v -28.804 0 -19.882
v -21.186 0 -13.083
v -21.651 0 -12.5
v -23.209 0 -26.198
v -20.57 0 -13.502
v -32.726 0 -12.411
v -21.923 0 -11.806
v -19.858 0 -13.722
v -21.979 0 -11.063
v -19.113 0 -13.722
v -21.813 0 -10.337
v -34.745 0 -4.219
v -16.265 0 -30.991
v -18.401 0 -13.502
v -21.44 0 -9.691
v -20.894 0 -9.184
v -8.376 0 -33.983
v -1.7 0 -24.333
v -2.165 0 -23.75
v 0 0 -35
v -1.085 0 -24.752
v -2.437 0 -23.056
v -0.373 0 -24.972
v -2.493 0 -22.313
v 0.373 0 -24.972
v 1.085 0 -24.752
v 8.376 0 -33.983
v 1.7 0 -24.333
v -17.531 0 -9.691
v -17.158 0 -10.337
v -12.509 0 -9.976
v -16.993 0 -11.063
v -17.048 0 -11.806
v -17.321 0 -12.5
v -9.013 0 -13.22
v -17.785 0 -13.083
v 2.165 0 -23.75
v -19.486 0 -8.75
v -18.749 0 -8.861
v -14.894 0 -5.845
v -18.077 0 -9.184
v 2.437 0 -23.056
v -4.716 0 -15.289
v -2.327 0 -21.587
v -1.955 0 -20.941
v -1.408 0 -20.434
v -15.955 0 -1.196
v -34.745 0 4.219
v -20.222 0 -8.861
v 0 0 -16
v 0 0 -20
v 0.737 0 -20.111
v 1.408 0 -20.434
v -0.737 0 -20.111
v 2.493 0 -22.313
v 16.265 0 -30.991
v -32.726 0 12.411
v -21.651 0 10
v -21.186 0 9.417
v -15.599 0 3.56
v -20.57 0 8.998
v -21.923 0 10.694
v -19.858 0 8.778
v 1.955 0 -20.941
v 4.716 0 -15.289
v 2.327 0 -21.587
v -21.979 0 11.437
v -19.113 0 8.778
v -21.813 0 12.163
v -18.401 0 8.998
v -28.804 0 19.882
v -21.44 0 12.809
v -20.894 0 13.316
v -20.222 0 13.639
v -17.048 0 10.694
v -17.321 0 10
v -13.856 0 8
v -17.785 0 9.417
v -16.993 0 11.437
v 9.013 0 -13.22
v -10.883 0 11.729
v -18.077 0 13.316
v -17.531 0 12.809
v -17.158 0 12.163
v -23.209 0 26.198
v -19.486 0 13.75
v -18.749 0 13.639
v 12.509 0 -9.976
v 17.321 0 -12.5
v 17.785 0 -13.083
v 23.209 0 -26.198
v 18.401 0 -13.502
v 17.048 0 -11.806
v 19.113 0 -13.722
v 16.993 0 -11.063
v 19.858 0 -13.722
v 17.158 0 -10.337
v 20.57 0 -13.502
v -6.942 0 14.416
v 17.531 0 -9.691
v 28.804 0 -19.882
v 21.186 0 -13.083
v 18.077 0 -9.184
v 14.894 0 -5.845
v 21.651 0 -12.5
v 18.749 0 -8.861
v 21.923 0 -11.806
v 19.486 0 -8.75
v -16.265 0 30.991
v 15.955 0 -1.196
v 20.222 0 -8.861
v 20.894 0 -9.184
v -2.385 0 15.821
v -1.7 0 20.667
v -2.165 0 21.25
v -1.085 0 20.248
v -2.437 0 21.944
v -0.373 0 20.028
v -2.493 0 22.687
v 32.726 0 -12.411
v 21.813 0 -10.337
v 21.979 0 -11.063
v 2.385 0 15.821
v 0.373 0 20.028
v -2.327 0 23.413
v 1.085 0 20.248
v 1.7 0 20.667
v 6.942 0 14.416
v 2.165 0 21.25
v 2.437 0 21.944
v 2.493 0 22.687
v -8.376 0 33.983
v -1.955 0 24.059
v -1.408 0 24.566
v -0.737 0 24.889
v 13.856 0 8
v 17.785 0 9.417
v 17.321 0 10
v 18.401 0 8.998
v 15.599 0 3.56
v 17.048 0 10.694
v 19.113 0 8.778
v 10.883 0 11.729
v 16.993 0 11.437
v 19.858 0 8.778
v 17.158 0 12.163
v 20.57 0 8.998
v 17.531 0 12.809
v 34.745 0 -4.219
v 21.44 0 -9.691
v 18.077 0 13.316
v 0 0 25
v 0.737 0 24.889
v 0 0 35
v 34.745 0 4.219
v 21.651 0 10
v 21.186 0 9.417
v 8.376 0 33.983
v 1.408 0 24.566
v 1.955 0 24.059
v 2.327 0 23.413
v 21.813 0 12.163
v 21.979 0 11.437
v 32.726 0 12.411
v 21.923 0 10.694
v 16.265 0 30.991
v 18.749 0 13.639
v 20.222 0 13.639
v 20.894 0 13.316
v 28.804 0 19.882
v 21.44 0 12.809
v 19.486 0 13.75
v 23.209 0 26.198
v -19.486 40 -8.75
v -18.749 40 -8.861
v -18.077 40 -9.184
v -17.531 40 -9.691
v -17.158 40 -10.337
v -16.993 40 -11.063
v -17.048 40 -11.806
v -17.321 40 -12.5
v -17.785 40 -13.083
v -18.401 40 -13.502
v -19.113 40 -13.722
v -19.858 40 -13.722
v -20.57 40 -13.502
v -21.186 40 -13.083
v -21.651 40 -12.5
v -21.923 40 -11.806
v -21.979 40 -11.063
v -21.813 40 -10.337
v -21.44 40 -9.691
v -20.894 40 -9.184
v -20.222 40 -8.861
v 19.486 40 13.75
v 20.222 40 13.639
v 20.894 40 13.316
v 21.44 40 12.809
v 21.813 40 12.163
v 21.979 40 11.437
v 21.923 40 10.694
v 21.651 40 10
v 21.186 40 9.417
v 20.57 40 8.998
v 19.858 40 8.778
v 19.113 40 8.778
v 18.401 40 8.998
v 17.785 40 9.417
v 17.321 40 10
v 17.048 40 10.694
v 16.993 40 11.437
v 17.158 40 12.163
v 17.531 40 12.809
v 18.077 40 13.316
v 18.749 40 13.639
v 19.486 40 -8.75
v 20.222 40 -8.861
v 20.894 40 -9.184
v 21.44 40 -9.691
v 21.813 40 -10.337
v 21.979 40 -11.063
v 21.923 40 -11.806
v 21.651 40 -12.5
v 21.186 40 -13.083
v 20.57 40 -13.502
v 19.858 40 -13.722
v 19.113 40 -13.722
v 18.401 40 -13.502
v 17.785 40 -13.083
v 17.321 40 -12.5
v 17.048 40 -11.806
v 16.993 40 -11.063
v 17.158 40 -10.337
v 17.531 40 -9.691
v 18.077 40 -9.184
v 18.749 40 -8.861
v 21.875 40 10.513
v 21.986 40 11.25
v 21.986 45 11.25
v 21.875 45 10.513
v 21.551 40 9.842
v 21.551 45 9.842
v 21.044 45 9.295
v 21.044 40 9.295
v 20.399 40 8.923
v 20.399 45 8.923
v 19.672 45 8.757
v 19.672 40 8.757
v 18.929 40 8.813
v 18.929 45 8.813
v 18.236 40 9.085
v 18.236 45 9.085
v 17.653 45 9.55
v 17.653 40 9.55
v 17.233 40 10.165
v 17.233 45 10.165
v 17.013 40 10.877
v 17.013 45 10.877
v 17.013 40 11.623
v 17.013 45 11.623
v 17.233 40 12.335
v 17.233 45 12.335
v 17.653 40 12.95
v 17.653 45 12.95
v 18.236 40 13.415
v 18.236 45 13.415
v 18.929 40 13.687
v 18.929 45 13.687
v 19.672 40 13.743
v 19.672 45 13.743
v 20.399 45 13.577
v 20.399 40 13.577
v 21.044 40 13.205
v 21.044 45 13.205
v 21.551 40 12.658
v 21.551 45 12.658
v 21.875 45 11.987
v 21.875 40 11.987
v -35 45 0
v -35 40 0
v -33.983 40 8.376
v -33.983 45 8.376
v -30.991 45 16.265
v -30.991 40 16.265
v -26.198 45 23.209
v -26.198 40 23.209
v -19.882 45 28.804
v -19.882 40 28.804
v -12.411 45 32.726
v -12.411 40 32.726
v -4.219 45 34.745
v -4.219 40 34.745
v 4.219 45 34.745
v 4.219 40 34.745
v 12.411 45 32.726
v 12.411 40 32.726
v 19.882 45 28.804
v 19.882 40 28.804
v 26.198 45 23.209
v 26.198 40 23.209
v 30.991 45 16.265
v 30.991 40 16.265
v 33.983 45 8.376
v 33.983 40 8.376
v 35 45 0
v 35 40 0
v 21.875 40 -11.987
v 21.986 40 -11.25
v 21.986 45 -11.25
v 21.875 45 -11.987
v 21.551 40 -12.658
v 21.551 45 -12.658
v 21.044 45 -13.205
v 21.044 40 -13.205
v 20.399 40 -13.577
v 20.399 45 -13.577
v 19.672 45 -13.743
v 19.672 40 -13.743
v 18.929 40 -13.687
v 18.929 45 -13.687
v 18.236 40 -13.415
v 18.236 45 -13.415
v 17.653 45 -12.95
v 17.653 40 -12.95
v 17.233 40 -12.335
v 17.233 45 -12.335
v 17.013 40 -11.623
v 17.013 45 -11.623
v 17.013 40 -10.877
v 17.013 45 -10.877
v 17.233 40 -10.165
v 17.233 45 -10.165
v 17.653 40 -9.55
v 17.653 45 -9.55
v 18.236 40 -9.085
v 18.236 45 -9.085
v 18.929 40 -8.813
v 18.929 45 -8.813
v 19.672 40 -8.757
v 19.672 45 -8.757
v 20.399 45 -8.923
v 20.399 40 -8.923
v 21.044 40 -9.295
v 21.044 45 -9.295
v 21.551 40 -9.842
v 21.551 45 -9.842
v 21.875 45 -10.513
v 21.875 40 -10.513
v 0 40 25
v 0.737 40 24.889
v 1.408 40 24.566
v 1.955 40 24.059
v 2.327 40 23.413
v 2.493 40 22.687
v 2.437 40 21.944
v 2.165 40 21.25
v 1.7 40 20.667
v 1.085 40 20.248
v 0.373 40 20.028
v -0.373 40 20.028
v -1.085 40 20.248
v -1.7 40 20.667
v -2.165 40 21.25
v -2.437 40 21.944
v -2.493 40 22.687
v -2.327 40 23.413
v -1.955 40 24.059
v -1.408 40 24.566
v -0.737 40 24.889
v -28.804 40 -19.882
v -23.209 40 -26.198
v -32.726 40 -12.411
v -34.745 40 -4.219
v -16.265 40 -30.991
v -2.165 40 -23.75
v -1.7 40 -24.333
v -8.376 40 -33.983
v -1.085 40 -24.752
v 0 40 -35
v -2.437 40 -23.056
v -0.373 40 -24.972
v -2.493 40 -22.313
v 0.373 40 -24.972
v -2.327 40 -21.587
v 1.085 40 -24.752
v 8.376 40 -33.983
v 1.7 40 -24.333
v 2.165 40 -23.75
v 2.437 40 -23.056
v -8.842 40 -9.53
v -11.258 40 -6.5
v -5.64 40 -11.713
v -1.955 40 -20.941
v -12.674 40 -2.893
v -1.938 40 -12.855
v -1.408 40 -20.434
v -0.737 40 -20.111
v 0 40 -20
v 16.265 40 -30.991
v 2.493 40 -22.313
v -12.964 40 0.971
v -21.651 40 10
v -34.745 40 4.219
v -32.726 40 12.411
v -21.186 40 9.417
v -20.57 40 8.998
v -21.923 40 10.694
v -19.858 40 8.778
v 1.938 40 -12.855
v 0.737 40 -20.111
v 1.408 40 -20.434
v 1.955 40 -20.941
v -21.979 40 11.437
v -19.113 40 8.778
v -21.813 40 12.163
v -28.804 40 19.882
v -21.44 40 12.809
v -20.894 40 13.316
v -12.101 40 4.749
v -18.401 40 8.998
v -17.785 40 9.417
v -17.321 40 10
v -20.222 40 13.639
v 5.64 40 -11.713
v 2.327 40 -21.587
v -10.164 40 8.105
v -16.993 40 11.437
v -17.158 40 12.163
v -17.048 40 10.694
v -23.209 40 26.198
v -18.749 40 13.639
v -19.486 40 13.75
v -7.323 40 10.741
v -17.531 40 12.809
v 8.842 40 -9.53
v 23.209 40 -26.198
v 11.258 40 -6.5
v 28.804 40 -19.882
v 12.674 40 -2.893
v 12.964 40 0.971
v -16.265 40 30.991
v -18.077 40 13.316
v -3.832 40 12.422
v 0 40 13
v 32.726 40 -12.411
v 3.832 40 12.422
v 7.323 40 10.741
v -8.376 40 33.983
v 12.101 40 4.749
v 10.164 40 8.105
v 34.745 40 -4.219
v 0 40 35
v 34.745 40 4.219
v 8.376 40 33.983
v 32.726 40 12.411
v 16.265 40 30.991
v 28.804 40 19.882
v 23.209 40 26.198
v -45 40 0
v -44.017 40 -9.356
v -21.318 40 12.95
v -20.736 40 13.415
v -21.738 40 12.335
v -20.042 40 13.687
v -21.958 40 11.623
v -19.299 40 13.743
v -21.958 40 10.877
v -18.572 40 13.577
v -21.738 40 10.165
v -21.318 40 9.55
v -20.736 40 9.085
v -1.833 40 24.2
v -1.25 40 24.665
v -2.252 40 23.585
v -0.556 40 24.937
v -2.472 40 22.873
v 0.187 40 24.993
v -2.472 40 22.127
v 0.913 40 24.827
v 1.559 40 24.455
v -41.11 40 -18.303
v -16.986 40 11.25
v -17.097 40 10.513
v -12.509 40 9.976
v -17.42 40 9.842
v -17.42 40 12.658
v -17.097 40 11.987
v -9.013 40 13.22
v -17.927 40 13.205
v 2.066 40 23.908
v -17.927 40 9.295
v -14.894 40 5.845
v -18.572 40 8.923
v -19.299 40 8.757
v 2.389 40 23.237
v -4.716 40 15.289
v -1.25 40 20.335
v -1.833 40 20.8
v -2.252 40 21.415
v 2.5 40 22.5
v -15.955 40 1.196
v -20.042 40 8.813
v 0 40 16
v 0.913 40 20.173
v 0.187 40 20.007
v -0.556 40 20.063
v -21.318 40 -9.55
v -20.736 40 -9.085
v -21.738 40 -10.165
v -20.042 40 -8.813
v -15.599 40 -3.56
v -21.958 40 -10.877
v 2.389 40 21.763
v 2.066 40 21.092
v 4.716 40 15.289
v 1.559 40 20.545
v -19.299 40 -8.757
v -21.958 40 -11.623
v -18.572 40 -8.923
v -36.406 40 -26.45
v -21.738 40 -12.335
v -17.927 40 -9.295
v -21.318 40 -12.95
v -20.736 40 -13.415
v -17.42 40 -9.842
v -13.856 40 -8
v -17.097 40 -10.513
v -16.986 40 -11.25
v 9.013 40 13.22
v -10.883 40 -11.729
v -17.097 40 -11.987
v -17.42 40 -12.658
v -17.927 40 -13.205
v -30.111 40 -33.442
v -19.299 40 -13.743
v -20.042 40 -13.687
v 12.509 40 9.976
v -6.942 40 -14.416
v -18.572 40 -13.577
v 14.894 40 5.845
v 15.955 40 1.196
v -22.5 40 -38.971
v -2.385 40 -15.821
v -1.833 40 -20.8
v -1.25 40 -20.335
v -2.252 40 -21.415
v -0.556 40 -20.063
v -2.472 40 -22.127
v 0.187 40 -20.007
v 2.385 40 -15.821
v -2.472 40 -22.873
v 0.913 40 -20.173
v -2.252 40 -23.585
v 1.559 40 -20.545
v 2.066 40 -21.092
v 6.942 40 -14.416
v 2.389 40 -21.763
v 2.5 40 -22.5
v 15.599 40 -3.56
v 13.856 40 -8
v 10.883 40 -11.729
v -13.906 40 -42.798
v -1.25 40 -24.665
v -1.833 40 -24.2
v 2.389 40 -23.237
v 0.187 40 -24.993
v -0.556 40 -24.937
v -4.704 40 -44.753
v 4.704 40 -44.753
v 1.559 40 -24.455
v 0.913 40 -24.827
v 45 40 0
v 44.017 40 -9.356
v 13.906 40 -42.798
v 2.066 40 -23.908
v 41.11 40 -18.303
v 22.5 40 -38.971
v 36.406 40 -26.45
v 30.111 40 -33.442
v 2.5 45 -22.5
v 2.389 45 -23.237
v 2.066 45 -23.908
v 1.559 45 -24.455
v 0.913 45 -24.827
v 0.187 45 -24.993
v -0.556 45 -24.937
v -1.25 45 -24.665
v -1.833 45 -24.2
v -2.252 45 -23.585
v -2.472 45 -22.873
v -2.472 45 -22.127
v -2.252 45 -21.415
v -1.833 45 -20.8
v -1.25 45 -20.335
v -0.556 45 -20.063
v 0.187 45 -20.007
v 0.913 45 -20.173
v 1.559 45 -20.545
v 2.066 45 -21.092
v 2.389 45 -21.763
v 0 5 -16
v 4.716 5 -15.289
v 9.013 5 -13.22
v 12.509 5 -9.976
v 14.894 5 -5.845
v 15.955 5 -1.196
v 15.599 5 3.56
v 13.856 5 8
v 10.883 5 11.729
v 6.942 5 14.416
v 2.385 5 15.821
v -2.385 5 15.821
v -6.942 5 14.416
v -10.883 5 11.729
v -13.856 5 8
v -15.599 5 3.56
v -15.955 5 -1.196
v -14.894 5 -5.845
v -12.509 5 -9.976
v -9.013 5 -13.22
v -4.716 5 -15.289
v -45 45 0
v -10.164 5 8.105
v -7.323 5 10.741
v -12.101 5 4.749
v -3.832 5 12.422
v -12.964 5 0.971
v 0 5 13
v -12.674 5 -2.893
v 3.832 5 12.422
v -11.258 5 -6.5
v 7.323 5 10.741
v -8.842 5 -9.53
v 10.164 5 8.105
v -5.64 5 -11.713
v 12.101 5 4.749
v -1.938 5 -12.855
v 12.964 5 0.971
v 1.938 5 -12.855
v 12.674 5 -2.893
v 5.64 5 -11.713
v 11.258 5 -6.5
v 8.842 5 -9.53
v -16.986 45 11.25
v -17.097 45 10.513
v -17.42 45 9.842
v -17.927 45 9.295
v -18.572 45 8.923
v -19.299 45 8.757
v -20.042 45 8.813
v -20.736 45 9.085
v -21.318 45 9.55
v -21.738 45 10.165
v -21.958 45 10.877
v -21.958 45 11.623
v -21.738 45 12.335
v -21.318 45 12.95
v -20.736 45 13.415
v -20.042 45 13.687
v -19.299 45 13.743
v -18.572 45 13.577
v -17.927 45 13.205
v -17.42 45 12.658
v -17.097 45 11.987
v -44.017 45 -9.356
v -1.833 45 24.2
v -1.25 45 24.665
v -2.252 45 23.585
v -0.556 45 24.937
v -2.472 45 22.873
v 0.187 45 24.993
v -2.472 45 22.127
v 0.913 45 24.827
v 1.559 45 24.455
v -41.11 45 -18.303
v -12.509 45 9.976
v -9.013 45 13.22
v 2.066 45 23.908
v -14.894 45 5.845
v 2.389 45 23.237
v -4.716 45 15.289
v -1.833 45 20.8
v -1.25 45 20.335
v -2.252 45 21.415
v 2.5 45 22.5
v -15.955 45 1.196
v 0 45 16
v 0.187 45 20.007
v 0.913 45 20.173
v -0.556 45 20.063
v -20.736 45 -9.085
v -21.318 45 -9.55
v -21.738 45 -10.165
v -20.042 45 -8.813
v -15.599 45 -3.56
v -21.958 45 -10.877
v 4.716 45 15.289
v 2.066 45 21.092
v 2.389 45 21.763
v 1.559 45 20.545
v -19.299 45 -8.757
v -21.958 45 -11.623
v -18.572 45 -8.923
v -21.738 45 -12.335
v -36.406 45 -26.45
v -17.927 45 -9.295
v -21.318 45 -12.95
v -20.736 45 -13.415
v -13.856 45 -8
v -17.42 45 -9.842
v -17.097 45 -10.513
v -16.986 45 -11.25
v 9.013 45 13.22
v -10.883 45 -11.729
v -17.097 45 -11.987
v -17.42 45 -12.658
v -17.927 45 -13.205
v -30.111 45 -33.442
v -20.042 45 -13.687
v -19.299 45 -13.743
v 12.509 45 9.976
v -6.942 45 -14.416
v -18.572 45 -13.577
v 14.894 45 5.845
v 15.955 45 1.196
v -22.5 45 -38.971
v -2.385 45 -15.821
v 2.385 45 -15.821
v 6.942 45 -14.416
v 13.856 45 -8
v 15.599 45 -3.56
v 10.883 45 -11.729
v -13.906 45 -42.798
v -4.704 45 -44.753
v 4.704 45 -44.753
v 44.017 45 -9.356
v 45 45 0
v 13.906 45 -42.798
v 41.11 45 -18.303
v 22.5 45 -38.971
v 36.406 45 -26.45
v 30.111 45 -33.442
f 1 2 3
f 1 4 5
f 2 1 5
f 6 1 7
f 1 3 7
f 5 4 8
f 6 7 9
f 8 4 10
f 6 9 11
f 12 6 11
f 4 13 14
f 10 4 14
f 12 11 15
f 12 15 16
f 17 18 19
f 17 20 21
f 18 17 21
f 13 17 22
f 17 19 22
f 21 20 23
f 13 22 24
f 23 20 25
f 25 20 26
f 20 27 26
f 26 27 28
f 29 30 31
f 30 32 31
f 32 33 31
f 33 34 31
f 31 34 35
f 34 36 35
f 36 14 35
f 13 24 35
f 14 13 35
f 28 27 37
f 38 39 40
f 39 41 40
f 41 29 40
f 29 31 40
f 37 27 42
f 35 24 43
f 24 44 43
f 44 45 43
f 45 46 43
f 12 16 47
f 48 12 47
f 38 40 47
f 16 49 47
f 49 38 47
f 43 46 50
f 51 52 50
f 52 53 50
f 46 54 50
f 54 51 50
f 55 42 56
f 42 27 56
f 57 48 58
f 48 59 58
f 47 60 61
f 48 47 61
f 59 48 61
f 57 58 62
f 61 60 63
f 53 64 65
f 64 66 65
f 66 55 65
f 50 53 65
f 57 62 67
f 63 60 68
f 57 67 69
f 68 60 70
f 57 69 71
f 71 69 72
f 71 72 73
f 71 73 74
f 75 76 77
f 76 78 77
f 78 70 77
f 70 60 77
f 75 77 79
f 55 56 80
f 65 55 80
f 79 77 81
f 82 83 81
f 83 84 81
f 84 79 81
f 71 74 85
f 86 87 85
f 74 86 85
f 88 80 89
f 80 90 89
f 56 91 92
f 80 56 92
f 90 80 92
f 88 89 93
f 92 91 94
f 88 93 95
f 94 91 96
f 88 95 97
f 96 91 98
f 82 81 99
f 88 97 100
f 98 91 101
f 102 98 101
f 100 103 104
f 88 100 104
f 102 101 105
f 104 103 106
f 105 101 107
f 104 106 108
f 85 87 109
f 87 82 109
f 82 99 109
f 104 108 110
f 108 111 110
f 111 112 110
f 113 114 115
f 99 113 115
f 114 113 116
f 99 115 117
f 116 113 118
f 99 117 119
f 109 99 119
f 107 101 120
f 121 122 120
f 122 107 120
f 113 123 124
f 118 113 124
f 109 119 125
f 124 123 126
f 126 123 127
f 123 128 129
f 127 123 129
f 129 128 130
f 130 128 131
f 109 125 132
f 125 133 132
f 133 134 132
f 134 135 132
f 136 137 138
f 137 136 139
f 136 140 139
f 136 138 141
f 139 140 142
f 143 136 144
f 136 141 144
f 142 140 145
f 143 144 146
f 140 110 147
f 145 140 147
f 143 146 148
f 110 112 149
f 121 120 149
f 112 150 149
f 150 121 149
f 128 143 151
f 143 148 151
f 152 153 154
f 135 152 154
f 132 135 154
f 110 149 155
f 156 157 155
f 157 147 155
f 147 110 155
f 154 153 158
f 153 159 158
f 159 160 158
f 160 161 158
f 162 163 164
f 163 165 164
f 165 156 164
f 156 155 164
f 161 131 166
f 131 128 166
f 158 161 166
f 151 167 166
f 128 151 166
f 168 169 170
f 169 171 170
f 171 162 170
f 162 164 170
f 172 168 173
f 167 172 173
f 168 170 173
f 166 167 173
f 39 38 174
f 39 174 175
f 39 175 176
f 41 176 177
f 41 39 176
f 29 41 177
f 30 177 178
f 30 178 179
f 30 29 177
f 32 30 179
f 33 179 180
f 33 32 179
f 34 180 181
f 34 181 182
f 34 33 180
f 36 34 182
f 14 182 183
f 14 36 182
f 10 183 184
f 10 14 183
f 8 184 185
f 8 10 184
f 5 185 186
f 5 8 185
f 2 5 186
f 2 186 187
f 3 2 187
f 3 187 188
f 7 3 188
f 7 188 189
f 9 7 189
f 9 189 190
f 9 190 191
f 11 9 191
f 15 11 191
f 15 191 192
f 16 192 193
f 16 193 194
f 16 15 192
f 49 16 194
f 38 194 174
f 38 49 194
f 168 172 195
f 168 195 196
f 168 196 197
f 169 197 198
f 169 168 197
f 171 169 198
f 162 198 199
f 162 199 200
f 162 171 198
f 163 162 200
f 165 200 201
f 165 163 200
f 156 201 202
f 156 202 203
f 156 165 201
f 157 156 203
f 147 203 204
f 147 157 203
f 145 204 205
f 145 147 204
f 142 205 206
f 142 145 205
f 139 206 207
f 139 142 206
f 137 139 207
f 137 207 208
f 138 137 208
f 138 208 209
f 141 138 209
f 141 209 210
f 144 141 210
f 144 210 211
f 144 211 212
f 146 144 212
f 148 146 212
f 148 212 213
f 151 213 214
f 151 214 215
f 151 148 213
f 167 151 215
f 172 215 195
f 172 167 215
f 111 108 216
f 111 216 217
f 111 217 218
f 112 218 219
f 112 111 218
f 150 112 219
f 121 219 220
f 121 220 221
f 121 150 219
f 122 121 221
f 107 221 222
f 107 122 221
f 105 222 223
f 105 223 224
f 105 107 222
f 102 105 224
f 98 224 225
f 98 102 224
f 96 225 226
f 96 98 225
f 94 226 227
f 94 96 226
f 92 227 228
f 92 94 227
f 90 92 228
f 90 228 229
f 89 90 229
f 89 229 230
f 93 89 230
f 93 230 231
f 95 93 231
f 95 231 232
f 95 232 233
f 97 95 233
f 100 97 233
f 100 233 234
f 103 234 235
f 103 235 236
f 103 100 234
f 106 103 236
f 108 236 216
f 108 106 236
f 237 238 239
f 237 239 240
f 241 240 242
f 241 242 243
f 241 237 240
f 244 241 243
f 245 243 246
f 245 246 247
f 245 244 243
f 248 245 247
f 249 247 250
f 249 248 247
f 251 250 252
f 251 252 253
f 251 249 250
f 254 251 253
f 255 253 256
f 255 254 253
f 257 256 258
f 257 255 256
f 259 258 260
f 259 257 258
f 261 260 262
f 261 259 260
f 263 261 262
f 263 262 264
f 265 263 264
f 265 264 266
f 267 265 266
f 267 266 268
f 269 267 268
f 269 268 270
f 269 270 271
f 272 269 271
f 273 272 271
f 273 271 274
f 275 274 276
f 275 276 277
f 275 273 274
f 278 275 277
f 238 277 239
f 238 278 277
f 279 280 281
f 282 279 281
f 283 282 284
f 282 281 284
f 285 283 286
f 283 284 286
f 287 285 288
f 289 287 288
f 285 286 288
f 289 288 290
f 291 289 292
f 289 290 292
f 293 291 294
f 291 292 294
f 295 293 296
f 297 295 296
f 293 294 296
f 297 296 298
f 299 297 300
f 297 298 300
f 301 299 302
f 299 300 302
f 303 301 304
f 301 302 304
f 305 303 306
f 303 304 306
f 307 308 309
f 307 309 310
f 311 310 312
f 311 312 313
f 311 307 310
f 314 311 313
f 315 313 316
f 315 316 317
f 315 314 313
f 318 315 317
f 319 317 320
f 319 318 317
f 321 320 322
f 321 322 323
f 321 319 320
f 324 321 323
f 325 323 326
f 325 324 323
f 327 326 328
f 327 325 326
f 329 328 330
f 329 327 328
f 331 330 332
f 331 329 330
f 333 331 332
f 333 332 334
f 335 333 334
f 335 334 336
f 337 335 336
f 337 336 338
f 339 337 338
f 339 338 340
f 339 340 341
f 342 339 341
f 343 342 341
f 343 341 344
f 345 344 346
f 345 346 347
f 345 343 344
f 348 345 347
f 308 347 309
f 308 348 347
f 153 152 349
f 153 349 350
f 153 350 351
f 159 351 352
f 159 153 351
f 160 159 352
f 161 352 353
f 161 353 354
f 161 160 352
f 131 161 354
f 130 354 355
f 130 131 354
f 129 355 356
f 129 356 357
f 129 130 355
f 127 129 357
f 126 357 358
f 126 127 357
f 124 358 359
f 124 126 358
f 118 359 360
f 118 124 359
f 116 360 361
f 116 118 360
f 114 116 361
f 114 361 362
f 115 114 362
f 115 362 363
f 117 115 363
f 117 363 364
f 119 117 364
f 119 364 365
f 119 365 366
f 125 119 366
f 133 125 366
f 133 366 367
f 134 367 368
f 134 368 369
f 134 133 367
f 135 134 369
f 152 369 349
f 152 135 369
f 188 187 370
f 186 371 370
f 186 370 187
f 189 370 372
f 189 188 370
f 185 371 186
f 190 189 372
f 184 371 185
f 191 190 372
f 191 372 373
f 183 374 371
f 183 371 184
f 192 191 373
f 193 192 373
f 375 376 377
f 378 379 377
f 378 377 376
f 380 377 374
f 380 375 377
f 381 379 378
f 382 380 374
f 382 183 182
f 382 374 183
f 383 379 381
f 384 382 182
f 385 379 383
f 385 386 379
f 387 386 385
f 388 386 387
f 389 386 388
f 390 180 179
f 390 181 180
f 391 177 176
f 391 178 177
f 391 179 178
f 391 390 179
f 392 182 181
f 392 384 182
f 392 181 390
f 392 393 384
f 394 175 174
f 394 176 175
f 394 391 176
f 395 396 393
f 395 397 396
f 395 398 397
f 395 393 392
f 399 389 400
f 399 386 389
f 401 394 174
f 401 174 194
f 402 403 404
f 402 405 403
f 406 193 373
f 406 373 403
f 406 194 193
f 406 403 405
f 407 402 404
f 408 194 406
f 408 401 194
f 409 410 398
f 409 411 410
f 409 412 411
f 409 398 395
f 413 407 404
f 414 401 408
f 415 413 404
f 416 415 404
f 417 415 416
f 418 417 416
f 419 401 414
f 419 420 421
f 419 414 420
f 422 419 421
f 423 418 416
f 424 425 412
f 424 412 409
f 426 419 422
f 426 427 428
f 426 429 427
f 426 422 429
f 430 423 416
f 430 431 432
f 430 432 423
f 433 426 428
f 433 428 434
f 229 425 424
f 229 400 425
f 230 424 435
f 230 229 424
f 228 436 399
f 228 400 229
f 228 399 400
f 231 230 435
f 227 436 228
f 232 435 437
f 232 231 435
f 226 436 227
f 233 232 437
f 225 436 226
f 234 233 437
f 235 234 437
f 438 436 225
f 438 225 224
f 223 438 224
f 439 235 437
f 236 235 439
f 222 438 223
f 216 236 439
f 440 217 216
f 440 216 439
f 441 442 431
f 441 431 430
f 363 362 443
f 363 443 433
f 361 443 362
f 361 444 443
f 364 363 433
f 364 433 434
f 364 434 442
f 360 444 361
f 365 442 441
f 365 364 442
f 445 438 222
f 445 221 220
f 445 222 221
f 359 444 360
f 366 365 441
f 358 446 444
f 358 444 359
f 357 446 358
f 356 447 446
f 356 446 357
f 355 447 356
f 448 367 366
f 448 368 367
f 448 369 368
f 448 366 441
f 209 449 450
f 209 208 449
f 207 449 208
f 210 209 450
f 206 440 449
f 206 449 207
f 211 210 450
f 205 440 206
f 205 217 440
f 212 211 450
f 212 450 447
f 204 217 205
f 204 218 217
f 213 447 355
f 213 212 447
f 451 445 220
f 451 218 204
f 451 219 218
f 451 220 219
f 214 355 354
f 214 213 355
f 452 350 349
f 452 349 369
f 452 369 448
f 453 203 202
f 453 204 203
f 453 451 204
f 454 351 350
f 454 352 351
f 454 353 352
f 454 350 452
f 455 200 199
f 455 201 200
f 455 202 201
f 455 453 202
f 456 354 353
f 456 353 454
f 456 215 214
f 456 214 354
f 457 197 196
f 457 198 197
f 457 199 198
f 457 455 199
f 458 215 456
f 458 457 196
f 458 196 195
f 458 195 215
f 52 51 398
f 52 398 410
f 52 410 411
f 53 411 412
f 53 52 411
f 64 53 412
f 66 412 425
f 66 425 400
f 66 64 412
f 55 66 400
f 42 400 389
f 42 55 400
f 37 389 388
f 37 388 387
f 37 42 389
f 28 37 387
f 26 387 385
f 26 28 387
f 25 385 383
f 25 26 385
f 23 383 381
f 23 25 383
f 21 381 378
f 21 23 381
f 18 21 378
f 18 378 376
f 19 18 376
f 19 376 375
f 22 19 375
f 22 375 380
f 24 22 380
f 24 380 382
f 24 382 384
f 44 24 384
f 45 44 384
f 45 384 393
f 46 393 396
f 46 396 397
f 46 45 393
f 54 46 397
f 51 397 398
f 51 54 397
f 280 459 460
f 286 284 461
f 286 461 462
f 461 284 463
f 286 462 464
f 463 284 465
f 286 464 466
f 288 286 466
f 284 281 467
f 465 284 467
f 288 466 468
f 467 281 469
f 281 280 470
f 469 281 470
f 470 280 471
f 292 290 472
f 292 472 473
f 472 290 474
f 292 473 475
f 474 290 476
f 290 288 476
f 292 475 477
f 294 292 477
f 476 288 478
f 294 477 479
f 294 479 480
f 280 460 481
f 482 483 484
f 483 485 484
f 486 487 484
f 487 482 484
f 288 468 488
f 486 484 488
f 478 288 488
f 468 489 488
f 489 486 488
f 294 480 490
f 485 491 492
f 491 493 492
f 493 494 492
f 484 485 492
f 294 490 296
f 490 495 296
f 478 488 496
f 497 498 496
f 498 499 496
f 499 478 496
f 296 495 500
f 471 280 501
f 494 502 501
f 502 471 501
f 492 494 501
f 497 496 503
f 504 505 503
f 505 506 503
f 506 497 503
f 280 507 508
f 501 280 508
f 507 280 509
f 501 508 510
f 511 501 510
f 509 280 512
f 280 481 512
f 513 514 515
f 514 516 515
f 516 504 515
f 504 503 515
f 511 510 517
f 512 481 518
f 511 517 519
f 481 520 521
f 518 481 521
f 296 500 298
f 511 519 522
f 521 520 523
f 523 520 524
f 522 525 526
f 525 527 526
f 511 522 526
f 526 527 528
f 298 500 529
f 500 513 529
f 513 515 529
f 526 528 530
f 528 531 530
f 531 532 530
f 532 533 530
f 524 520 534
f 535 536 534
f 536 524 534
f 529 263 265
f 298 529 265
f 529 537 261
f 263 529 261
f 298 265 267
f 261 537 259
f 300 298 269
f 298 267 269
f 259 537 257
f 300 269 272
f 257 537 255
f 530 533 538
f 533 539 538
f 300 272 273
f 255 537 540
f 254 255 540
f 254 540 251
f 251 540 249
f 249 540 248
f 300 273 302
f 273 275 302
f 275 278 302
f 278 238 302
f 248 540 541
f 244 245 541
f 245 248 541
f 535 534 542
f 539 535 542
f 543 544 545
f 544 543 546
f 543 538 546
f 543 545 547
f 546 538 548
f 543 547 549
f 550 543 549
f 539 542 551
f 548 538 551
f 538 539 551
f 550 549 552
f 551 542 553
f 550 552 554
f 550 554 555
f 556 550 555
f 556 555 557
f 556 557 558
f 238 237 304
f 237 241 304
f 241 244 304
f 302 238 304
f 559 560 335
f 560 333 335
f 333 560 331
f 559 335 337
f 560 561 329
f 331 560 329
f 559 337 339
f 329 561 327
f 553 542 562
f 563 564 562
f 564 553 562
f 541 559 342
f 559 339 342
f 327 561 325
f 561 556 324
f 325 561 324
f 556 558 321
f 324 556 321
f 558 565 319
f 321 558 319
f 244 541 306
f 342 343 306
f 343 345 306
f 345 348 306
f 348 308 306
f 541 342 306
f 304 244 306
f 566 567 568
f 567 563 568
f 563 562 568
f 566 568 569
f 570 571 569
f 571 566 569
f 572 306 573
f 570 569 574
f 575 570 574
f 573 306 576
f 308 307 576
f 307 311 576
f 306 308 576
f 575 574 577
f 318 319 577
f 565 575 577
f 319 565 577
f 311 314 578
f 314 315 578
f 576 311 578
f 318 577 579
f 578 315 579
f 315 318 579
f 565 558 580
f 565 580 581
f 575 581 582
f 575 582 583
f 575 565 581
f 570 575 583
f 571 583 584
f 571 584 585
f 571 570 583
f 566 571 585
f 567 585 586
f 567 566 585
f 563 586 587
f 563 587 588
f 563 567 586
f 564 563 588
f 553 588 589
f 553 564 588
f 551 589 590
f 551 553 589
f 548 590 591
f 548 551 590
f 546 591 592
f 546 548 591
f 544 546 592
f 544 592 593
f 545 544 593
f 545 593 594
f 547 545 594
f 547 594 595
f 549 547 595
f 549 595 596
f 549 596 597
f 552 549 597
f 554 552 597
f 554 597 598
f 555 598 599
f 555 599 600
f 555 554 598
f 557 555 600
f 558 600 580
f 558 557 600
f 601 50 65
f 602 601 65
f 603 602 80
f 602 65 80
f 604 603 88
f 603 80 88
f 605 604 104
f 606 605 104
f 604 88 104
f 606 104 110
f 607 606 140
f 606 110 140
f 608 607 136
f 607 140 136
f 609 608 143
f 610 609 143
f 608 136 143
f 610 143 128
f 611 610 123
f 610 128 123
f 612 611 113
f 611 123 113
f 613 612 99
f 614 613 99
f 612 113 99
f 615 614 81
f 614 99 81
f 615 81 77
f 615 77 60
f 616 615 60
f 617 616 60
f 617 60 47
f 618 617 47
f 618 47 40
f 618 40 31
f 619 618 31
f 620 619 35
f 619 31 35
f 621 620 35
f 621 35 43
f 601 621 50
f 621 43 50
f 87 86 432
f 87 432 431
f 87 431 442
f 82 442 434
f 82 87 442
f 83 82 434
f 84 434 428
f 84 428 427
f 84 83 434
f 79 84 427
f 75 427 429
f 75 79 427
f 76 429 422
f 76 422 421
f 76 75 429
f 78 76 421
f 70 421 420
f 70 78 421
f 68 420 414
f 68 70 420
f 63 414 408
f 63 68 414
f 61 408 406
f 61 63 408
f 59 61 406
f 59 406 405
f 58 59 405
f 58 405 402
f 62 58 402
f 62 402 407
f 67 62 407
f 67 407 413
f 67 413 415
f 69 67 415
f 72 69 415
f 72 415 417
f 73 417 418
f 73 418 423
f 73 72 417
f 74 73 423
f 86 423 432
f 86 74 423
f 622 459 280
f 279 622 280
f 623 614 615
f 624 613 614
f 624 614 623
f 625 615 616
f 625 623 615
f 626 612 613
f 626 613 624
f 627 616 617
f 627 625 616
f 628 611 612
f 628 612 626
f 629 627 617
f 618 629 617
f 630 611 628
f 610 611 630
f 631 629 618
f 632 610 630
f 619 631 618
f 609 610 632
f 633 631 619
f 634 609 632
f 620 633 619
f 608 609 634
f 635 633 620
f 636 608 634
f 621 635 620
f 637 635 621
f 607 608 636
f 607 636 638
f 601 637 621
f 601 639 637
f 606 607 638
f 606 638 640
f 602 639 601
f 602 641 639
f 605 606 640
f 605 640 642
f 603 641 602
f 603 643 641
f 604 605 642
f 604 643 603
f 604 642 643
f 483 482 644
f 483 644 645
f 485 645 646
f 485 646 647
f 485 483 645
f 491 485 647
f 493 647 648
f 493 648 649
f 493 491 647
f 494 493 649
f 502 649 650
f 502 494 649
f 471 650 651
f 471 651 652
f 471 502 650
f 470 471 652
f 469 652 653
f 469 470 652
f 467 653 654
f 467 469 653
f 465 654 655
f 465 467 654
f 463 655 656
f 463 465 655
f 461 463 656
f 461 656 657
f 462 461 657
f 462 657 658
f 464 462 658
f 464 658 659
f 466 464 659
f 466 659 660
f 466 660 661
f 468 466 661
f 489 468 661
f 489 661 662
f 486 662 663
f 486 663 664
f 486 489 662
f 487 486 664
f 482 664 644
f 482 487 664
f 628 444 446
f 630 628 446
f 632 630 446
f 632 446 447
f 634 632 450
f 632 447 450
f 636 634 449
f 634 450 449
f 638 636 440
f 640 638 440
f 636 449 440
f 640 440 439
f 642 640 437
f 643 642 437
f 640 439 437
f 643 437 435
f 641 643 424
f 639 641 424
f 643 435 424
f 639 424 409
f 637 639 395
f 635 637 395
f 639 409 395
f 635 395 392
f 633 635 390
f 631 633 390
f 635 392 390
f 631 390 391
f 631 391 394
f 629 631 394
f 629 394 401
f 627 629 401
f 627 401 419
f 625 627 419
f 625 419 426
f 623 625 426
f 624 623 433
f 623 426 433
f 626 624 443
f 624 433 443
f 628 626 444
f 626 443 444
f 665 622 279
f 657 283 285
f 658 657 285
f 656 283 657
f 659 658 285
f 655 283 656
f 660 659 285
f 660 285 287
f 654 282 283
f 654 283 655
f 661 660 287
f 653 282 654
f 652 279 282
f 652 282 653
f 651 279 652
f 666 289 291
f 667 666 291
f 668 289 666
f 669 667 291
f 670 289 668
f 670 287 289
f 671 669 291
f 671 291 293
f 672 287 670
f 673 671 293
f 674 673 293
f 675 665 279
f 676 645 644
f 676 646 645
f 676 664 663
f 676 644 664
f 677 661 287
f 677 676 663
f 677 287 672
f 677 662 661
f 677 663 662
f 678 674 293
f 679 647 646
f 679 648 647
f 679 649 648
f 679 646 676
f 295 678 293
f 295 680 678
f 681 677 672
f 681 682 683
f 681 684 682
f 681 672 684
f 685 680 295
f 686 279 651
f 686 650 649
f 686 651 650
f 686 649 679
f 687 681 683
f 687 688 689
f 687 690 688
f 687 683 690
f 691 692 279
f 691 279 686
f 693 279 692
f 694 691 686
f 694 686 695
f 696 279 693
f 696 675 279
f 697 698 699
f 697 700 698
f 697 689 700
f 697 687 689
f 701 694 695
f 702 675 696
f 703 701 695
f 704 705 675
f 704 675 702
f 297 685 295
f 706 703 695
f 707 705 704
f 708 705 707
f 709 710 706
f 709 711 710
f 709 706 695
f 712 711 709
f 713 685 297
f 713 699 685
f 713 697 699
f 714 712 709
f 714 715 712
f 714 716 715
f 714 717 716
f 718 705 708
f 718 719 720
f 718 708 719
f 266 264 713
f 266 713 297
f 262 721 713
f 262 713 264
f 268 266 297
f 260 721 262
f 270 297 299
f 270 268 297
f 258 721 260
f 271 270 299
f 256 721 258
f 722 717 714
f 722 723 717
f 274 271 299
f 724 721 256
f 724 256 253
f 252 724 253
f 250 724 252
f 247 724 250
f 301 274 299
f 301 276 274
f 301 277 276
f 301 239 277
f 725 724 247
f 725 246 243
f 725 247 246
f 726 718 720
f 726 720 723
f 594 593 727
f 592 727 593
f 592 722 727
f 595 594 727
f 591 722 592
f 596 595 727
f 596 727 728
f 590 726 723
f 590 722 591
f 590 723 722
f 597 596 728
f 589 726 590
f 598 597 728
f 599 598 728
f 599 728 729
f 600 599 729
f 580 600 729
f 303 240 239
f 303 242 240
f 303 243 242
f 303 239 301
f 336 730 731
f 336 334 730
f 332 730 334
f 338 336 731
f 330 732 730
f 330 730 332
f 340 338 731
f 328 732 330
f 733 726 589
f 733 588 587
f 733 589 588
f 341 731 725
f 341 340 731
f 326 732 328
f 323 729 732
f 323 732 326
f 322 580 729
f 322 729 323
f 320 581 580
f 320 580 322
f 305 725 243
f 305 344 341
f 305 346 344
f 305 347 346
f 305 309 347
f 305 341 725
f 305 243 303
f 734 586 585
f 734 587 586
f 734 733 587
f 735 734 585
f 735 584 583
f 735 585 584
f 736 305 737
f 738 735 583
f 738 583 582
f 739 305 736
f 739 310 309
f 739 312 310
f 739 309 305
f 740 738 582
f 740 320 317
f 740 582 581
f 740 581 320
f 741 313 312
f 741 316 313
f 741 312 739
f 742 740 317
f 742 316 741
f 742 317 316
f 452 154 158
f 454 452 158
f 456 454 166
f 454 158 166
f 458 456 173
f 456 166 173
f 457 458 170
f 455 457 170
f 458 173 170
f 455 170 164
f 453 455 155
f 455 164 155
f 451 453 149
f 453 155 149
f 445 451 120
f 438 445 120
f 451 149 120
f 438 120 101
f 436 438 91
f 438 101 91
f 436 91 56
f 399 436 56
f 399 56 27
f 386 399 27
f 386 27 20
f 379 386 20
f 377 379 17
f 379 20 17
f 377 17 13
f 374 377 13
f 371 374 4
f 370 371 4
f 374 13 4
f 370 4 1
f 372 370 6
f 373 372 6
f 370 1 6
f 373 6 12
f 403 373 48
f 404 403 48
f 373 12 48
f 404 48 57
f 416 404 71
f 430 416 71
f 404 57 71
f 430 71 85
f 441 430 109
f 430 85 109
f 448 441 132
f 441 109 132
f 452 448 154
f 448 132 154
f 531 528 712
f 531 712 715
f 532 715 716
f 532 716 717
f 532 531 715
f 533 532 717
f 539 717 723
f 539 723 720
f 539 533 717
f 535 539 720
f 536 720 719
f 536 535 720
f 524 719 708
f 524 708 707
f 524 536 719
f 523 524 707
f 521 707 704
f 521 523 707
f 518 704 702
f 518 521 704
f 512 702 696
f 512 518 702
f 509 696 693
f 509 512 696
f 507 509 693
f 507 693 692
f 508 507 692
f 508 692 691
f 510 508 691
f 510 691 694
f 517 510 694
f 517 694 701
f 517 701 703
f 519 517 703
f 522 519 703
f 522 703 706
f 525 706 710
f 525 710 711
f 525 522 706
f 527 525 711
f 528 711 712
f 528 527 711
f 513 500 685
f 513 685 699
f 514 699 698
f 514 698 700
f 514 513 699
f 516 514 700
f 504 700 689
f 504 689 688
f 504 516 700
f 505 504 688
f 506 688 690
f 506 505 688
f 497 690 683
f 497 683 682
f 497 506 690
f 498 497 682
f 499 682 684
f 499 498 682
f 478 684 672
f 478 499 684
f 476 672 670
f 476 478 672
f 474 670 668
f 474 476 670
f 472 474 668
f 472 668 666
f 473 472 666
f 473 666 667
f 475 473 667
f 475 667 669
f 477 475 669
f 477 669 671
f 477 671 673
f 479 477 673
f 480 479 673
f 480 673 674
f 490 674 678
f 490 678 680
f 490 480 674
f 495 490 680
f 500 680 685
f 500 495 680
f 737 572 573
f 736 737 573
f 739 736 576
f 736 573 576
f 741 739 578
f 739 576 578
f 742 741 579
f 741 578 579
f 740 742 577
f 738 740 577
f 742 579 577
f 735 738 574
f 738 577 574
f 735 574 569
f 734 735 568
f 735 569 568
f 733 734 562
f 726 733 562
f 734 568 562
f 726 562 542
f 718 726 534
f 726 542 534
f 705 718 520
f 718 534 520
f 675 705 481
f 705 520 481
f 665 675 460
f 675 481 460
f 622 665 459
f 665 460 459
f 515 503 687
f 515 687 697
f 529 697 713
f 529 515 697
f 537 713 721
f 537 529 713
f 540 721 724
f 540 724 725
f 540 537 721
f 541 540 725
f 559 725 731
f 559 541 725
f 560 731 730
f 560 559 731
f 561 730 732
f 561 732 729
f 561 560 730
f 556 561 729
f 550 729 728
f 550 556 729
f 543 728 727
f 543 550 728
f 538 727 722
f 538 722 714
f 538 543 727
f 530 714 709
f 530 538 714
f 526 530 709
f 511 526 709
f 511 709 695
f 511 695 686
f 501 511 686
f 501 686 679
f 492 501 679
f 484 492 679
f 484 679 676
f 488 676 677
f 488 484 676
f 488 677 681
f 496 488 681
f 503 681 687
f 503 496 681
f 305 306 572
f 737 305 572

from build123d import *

# Parameters (mm, degrees)
SKETCH1_R                 = 35
SKETCH1_R_2               = 5
SKETCH1_R_3               = 2.5
BOSS_EXTRUDE1_DEPTH       = 40
SKETCH2_R                 = 16
CUT_EXTRUDE1_DEPTH        = 5
SKETCH5_R                 = 13
CUT_EXTRUDE2_DEPTH        = 35
BOSS_EXTRUDE2_OUTLINE_R   = 2.5
BOSS_EXTRUDE2_OUTLINE_R_2 = 13
BOSS_EXTRUDE2_DEPTH       = 5
CUT_EXTRUDE3_START        = -5
SKETCH7_R                 = 16
CUT_EXTRUDE3_DEPTH        = 5


# Read off the part's stored shape, not the designer's step: Boss-Extrude2
with BuildPart() as part:
    # Sketch1 → Boss-Extrude1 (new body)
    with BuildSketch(Plane(origin=(0, 0, 0), x_dir=(1, 0, 0), z_dir=(0, 1, 0))):
        with Locations(Location((0, 0, 0), (0, 0, 270))):
            Circle(SKETCH1_R)
        with Locations(Location((0, 0, 0), (0, 0, 270))):
            Circle(SKETCH1_R_2, mode=Mode.SUBTRACT)
        with Locations(Location((0, 22.5, 0), (0, 0, 270))):
            Circle(SKETCH1_R_3, mode=Mode.SUBTRACT)
        with Locations(Location((19.485571585, 11.25, 0), (0, 0, 270))):
            Circle(SKETCH1_R_3, mode=Mode.SUBTRACT)
        with Locations(Location((19.485571585, -11.25, 0), (0, 0, 270))):
            Circle(SKETCH1_R_3, mode=Mode.SUBTRACT)
        with Locations(Location((0, -22.5, 0), (0, 0, 270))):
            Circle(SKETCH1_R_3, mode=Mode.SUBTRACT)
        with Locations(Location((-19.485571585, -11.25, 0), (0, 0, 270))):
            Circle(SKETCH1_R_3, mode=Mode.SUBTRACT)
        with Locations(Location((-19.485571585, 11.25, 0), (0, 0, 270))):
            Circle(SKETCH1_R_3, mode=Mode.SUBTRACT)
    extrude(amount=BOSS_EXTRUDE1_DEPTH)

    # Sketch2 → Cut-Extrude1 (cut)
    with BuildSketch(Plane.XZ):
        with Locations(Location((0, 0, 0), (0, 0, 270))):
            Circle(SKETCH2_R)
    extrude(amount=-CUT_EXTRUDE1_DEPTH, mode=Mode.SUBTRACT)

    # Sketch5 → Cut-Extrude2 (cut)
    with BuildSketch(Plane(origin=(0, 40, 0), x_dir=(1, 0, 0), z_dir=(0, 1, 0))):
        with Locations(Location((0, 0, 0), (0, 0, 270))):
            Circle(SKETCH5_R)
    extrude(amount=-CUT_EXTRUDE2_DEPTH, mode=Mode.SUBTRACT)


with BuildPart() as body_2:
    # Boss-Extrude2 outline → Boss-Extrude2 (new body)
    with BuildSketch(Plane(origin=(0, 40, 0), x_dir=(1, 0, 0), z_dir=(0, 1, 0))):
        with BuildLine():
            Line((35, 0), (45, 0))
            ThreePointArc((45, 0), (0, 45), (-45, 0))
            Line((-45, 0), (-35, 0))
            ThreePointArc((-35, 0), (0, -35), (35, 0))
        make_face()
        with Locations((-19.485571585, -11.25)):
            Circle(BOSS_EXTRUDE2_OUTLINE_R, mode=Mode.SUBTRACT)
        with Locations((0, -22.5)):
            Circle(BOSS_EXTRUDE2_OUTLINE_R, mode=Mode.SUBTRACT)
        with Locations((19.485571585, -11.25)):
            Circle(BOSS_EXTRUDE2_OUTLINE_R, mode=Mode.SUBTRACT)
        Circle(BOSS_EXTRUDE2_OUTLINE_R_2, mode=Mode.SUBTRACT)
        with Locations((-19.485571585, 11.25)):
            Circle(BOSS_EXTRUDE2_OUTLINE_R, mode=Mode.SUBTRACT)
        with Locations((19.485571585, 11.25)):
            Circle(BOSS_EXTRUDE2_OUTLINE_R, mode=Mode.SUBTRACT)
        with Locations((0, 22.5)):
            Circle(BOSS_EXTRUDE2_OUTLINE_R, mode=Mode.SUBTRACT)
    extrude(amount=BOSS_EXTRUDE2_DEPTH)

    # Sketch7 → Cut-Extrude3 (cut)
    with BuildSketch(Plane(origin=(0, 45, 0), x_dir=(1, 0, 0), z_dir=(0, 1, 0)).offset(CUT_EXTRUDE3_START)):
        with Locations(Location((0, 0, 0), (0, 0, 270))):
            Circle(SKETCH7_R)
    extrude(amount=CUT_EXTRUDE3_DEPTH, mode=Mode.SUBTRACT)


solid = Compound([part.part, body_2.part])
